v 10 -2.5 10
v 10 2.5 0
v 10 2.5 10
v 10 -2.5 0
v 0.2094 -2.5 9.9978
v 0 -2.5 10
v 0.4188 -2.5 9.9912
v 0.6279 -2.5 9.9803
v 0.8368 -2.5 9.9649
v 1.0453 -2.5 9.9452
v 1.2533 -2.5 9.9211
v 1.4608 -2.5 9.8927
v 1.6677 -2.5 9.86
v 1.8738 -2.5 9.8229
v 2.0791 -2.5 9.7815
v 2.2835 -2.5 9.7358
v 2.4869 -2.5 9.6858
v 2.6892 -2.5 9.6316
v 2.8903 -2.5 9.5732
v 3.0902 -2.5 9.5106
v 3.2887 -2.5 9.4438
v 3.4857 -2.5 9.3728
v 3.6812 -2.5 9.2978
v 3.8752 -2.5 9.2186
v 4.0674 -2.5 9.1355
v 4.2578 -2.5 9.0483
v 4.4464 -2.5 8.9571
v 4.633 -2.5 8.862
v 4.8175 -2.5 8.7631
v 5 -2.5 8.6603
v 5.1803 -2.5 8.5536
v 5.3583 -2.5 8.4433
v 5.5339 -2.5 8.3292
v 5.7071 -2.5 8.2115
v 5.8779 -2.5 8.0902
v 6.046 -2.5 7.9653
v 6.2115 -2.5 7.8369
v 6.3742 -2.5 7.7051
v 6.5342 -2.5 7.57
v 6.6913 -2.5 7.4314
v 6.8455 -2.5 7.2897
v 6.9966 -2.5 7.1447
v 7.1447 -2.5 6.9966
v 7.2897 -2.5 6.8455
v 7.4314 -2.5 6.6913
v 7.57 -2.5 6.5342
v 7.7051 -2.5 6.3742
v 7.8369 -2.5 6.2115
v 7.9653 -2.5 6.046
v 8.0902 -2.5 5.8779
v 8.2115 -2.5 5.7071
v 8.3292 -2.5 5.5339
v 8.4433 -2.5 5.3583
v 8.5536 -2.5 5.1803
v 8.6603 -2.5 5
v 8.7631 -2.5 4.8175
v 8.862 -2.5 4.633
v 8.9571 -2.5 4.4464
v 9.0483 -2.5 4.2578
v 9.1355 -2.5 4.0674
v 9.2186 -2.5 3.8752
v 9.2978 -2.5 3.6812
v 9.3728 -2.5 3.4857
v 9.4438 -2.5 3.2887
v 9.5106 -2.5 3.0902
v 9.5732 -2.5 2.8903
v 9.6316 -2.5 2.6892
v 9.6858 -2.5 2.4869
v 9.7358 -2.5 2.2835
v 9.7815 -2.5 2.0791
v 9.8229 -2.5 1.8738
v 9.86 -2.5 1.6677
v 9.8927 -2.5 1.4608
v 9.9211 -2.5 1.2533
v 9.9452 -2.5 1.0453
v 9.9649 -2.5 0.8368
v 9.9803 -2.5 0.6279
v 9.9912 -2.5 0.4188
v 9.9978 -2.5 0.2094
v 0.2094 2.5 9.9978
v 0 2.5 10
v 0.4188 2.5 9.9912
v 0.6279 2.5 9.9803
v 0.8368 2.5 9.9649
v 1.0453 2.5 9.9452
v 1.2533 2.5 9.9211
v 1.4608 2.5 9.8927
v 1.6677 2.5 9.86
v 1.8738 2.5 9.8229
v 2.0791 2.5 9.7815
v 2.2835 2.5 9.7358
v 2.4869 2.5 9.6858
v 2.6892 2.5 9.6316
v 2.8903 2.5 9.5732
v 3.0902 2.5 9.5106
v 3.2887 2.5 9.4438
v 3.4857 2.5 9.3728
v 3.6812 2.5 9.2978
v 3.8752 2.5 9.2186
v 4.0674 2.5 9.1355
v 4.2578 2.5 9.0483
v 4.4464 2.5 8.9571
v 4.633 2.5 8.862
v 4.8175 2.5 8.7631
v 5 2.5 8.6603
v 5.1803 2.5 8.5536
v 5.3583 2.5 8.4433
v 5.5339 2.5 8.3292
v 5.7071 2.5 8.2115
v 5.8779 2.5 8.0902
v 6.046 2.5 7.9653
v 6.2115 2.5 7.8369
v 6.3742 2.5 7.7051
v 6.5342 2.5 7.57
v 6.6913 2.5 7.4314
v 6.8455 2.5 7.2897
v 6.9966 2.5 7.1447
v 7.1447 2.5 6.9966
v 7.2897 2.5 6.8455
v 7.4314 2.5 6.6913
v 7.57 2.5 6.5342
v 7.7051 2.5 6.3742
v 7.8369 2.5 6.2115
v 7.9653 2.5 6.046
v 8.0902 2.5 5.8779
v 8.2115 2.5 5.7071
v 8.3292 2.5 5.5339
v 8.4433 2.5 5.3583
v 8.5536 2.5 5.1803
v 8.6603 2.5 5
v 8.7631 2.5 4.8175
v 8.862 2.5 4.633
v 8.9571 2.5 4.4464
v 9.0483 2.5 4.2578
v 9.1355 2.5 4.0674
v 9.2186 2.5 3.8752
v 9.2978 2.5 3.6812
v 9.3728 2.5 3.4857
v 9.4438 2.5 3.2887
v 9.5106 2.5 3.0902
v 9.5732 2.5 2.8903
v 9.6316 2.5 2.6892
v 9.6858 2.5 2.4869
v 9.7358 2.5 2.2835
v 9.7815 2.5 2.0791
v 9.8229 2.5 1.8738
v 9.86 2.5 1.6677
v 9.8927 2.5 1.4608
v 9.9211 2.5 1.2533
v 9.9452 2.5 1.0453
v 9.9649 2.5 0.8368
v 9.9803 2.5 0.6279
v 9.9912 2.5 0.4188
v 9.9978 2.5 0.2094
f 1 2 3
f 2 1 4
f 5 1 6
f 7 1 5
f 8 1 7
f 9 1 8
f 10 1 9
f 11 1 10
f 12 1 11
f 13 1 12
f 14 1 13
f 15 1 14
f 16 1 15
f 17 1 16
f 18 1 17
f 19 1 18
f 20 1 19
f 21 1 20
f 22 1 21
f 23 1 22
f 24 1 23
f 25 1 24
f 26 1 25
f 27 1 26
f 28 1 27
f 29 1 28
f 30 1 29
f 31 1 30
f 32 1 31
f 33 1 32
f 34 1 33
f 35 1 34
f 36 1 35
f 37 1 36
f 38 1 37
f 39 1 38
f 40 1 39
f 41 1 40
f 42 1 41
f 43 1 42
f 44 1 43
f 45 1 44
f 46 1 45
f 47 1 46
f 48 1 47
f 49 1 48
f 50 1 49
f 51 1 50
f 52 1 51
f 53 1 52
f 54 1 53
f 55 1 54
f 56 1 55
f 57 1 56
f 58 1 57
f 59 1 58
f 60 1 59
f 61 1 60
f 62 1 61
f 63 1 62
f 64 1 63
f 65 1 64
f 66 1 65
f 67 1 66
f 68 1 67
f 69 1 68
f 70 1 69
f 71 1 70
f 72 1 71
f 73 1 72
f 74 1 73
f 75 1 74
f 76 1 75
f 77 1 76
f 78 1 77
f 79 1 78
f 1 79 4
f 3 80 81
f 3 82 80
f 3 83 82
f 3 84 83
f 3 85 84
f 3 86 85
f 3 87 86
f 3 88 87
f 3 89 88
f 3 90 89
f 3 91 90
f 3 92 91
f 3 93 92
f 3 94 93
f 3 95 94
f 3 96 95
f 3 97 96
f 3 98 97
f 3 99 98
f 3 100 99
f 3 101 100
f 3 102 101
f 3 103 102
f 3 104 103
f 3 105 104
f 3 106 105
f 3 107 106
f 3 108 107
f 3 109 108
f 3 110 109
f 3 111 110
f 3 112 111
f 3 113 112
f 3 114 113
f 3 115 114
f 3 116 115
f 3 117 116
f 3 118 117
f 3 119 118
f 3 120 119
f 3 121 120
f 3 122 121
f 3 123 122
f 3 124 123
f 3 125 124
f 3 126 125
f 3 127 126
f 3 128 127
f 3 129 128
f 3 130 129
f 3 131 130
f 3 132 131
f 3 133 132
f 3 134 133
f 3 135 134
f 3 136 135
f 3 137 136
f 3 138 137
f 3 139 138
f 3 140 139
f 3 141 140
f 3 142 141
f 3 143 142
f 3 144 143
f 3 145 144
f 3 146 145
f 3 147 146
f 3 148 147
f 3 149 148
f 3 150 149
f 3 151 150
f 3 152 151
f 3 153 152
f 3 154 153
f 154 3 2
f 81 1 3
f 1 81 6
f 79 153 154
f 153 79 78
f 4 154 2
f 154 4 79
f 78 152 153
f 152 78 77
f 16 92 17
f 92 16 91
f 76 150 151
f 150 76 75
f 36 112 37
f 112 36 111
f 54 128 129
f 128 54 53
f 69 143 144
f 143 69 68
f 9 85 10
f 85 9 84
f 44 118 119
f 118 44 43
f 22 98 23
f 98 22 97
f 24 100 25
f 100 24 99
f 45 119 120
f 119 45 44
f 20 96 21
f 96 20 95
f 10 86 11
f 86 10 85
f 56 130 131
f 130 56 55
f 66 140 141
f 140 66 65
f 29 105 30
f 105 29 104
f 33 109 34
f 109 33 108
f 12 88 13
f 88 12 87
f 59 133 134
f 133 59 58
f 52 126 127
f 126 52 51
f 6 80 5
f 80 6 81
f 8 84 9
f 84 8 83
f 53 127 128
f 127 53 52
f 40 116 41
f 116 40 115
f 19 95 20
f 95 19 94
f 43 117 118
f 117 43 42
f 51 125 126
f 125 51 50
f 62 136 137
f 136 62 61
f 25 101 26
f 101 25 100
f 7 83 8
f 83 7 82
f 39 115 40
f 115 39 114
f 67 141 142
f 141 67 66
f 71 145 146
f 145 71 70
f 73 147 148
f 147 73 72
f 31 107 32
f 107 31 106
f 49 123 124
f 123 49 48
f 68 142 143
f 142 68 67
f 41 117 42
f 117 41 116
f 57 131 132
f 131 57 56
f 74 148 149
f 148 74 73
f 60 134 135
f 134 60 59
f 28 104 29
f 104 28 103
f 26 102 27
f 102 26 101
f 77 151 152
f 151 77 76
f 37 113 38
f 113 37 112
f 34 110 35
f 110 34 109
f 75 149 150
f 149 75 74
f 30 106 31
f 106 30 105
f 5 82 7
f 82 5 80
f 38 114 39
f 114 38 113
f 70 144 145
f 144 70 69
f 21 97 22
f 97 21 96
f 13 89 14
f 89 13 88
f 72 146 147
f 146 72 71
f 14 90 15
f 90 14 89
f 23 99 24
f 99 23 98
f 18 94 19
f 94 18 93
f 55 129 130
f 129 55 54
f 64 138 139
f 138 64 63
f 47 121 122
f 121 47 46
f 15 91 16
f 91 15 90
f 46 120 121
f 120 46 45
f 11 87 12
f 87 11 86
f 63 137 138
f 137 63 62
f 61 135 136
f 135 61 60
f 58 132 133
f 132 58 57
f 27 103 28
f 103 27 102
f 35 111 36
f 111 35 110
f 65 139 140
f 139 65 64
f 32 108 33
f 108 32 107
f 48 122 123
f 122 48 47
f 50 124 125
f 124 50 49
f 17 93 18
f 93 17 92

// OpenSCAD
/*
Copyright (C) Saeed Gholami Shahbandi. All rights reserved.
Author: Saeed Gholami Shahbandi (saeed.gh.sh@gmail.com)

This file is part of Arrangement Library.
The of Arrangement Library is free software: you can redistribute it and/or
modify it under the terms of the GNU Lesser General Public License as published
by the Free Software Foundation, either version 3 of the License,
or (at your option) any later version.

This program is distributed in the hope that it will be useful, but WITHOUT ANY
WARRANTY; without even the implied warranty of MERCHANTABILITY or FITNESS FOR A
PARTICULAR PURPOSE. See the GNU Lesser General Public License for more details.

You should have received a copy of the GNU Lesser General Public License along
with this program. If not, see <http://www.gnu.org/licenses/>
*/
tol = 0.01;
fragments = 300;

// TODO: WIP

// TODO: start with drawing quadrant
// along x (y-z plane): q1, q2, q3, q4
// along y (z-x plane): q1, q2, q3, q4
// along z (x-y plane): q1, q2, q3, q4

module fillet(radius, length, position, quadrant, along_axis){
    intersection(){
        difference(){
            cube([2*radius, 2*radius, length], center=true);

            cylinder(h=length+tol, r=radius, center=true, $fn=fragments);
        }
        translate([radius/2, radius/2, 0])
        cube([radius, radius, length], center=true);
    }
}

module position_fillet(position, quadrant){
    if      (quadrant==1){
        rotate([0, 0, 0])
        translate(position)
        children();
    }
    else if (quadrant==2){
        rotate([0, 0, 90])
        translate(position)
        children();
    }
    else if (quadrant==3){
        rotate([0, 0, 180])
        translate(position)
        children();
    }
    else if (quadrant==4){
        rotate([0, 0, 270])
        translate(position)
        children();
    }
    else {
        echo("Wrong direction key");
    }
}

module align_fillet_along_axis(axis){
    if (axis == "x"){
        // y-z
        rotate([90, 0, 90])
        children();
    }
    else if (axis == "y"){
        // z-x
        rotate([90, 0, 0])
        children();
    }
    else if (axis == "z"){
        // x-y
        rotate([0, 0, 0])
        children();
    }
    else{
        echo("Wrong axis key");
    }
}

align_fillet_along_axis(axis="y")
position_fillet(position=[0, 0, 0], quadrant=1)
fillet(radius = 10, length = 5);
